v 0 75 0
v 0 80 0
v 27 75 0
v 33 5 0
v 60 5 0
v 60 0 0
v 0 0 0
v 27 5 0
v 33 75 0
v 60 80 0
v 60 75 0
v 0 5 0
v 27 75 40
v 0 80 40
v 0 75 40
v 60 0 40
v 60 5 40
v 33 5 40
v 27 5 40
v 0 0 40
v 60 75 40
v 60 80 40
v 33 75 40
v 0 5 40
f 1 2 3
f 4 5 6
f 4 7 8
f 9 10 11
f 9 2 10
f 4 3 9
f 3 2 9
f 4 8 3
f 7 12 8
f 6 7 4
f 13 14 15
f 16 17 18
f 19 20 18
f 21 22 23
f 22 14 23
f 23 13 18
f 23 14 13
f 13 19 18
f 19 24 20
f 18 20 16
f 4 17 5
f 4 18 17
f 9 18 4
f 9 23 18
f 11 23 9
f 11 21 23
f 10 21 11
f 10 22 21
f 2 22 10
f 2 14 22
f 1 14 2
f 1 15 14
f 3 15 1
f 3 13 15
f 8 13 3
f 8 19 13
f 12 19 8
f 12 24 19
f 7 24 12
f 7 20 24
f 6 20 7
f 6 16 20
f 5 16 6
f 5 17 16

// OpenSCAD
$fn = 32;

// ----------------------------------------------------------------------
// Structural section: ibeam 60 x 80 mm
// ----------------------------------------------------------------------

// --- parameters (mm) ---
sec_w = 60;               // section width, X
sec_h = 80;               // section height, Y
flange_t = 5;             // flange thickness
web_t = 6;                // web thickness
plate_t = 40;             // cut length, Z (extrusion height)

profile = [[0, 0], [60, 0], [60, 5], [33, 5], [33, 75], [60, 75], [60, 80], [0, 80], [0, 75], [27, 75], [27, 5], [0, 5]];  // primary outline, 12 points, counter clockwise

// --- the one profile operation ---
linear_extrude(height = plate_t) polygon(points = profile);
